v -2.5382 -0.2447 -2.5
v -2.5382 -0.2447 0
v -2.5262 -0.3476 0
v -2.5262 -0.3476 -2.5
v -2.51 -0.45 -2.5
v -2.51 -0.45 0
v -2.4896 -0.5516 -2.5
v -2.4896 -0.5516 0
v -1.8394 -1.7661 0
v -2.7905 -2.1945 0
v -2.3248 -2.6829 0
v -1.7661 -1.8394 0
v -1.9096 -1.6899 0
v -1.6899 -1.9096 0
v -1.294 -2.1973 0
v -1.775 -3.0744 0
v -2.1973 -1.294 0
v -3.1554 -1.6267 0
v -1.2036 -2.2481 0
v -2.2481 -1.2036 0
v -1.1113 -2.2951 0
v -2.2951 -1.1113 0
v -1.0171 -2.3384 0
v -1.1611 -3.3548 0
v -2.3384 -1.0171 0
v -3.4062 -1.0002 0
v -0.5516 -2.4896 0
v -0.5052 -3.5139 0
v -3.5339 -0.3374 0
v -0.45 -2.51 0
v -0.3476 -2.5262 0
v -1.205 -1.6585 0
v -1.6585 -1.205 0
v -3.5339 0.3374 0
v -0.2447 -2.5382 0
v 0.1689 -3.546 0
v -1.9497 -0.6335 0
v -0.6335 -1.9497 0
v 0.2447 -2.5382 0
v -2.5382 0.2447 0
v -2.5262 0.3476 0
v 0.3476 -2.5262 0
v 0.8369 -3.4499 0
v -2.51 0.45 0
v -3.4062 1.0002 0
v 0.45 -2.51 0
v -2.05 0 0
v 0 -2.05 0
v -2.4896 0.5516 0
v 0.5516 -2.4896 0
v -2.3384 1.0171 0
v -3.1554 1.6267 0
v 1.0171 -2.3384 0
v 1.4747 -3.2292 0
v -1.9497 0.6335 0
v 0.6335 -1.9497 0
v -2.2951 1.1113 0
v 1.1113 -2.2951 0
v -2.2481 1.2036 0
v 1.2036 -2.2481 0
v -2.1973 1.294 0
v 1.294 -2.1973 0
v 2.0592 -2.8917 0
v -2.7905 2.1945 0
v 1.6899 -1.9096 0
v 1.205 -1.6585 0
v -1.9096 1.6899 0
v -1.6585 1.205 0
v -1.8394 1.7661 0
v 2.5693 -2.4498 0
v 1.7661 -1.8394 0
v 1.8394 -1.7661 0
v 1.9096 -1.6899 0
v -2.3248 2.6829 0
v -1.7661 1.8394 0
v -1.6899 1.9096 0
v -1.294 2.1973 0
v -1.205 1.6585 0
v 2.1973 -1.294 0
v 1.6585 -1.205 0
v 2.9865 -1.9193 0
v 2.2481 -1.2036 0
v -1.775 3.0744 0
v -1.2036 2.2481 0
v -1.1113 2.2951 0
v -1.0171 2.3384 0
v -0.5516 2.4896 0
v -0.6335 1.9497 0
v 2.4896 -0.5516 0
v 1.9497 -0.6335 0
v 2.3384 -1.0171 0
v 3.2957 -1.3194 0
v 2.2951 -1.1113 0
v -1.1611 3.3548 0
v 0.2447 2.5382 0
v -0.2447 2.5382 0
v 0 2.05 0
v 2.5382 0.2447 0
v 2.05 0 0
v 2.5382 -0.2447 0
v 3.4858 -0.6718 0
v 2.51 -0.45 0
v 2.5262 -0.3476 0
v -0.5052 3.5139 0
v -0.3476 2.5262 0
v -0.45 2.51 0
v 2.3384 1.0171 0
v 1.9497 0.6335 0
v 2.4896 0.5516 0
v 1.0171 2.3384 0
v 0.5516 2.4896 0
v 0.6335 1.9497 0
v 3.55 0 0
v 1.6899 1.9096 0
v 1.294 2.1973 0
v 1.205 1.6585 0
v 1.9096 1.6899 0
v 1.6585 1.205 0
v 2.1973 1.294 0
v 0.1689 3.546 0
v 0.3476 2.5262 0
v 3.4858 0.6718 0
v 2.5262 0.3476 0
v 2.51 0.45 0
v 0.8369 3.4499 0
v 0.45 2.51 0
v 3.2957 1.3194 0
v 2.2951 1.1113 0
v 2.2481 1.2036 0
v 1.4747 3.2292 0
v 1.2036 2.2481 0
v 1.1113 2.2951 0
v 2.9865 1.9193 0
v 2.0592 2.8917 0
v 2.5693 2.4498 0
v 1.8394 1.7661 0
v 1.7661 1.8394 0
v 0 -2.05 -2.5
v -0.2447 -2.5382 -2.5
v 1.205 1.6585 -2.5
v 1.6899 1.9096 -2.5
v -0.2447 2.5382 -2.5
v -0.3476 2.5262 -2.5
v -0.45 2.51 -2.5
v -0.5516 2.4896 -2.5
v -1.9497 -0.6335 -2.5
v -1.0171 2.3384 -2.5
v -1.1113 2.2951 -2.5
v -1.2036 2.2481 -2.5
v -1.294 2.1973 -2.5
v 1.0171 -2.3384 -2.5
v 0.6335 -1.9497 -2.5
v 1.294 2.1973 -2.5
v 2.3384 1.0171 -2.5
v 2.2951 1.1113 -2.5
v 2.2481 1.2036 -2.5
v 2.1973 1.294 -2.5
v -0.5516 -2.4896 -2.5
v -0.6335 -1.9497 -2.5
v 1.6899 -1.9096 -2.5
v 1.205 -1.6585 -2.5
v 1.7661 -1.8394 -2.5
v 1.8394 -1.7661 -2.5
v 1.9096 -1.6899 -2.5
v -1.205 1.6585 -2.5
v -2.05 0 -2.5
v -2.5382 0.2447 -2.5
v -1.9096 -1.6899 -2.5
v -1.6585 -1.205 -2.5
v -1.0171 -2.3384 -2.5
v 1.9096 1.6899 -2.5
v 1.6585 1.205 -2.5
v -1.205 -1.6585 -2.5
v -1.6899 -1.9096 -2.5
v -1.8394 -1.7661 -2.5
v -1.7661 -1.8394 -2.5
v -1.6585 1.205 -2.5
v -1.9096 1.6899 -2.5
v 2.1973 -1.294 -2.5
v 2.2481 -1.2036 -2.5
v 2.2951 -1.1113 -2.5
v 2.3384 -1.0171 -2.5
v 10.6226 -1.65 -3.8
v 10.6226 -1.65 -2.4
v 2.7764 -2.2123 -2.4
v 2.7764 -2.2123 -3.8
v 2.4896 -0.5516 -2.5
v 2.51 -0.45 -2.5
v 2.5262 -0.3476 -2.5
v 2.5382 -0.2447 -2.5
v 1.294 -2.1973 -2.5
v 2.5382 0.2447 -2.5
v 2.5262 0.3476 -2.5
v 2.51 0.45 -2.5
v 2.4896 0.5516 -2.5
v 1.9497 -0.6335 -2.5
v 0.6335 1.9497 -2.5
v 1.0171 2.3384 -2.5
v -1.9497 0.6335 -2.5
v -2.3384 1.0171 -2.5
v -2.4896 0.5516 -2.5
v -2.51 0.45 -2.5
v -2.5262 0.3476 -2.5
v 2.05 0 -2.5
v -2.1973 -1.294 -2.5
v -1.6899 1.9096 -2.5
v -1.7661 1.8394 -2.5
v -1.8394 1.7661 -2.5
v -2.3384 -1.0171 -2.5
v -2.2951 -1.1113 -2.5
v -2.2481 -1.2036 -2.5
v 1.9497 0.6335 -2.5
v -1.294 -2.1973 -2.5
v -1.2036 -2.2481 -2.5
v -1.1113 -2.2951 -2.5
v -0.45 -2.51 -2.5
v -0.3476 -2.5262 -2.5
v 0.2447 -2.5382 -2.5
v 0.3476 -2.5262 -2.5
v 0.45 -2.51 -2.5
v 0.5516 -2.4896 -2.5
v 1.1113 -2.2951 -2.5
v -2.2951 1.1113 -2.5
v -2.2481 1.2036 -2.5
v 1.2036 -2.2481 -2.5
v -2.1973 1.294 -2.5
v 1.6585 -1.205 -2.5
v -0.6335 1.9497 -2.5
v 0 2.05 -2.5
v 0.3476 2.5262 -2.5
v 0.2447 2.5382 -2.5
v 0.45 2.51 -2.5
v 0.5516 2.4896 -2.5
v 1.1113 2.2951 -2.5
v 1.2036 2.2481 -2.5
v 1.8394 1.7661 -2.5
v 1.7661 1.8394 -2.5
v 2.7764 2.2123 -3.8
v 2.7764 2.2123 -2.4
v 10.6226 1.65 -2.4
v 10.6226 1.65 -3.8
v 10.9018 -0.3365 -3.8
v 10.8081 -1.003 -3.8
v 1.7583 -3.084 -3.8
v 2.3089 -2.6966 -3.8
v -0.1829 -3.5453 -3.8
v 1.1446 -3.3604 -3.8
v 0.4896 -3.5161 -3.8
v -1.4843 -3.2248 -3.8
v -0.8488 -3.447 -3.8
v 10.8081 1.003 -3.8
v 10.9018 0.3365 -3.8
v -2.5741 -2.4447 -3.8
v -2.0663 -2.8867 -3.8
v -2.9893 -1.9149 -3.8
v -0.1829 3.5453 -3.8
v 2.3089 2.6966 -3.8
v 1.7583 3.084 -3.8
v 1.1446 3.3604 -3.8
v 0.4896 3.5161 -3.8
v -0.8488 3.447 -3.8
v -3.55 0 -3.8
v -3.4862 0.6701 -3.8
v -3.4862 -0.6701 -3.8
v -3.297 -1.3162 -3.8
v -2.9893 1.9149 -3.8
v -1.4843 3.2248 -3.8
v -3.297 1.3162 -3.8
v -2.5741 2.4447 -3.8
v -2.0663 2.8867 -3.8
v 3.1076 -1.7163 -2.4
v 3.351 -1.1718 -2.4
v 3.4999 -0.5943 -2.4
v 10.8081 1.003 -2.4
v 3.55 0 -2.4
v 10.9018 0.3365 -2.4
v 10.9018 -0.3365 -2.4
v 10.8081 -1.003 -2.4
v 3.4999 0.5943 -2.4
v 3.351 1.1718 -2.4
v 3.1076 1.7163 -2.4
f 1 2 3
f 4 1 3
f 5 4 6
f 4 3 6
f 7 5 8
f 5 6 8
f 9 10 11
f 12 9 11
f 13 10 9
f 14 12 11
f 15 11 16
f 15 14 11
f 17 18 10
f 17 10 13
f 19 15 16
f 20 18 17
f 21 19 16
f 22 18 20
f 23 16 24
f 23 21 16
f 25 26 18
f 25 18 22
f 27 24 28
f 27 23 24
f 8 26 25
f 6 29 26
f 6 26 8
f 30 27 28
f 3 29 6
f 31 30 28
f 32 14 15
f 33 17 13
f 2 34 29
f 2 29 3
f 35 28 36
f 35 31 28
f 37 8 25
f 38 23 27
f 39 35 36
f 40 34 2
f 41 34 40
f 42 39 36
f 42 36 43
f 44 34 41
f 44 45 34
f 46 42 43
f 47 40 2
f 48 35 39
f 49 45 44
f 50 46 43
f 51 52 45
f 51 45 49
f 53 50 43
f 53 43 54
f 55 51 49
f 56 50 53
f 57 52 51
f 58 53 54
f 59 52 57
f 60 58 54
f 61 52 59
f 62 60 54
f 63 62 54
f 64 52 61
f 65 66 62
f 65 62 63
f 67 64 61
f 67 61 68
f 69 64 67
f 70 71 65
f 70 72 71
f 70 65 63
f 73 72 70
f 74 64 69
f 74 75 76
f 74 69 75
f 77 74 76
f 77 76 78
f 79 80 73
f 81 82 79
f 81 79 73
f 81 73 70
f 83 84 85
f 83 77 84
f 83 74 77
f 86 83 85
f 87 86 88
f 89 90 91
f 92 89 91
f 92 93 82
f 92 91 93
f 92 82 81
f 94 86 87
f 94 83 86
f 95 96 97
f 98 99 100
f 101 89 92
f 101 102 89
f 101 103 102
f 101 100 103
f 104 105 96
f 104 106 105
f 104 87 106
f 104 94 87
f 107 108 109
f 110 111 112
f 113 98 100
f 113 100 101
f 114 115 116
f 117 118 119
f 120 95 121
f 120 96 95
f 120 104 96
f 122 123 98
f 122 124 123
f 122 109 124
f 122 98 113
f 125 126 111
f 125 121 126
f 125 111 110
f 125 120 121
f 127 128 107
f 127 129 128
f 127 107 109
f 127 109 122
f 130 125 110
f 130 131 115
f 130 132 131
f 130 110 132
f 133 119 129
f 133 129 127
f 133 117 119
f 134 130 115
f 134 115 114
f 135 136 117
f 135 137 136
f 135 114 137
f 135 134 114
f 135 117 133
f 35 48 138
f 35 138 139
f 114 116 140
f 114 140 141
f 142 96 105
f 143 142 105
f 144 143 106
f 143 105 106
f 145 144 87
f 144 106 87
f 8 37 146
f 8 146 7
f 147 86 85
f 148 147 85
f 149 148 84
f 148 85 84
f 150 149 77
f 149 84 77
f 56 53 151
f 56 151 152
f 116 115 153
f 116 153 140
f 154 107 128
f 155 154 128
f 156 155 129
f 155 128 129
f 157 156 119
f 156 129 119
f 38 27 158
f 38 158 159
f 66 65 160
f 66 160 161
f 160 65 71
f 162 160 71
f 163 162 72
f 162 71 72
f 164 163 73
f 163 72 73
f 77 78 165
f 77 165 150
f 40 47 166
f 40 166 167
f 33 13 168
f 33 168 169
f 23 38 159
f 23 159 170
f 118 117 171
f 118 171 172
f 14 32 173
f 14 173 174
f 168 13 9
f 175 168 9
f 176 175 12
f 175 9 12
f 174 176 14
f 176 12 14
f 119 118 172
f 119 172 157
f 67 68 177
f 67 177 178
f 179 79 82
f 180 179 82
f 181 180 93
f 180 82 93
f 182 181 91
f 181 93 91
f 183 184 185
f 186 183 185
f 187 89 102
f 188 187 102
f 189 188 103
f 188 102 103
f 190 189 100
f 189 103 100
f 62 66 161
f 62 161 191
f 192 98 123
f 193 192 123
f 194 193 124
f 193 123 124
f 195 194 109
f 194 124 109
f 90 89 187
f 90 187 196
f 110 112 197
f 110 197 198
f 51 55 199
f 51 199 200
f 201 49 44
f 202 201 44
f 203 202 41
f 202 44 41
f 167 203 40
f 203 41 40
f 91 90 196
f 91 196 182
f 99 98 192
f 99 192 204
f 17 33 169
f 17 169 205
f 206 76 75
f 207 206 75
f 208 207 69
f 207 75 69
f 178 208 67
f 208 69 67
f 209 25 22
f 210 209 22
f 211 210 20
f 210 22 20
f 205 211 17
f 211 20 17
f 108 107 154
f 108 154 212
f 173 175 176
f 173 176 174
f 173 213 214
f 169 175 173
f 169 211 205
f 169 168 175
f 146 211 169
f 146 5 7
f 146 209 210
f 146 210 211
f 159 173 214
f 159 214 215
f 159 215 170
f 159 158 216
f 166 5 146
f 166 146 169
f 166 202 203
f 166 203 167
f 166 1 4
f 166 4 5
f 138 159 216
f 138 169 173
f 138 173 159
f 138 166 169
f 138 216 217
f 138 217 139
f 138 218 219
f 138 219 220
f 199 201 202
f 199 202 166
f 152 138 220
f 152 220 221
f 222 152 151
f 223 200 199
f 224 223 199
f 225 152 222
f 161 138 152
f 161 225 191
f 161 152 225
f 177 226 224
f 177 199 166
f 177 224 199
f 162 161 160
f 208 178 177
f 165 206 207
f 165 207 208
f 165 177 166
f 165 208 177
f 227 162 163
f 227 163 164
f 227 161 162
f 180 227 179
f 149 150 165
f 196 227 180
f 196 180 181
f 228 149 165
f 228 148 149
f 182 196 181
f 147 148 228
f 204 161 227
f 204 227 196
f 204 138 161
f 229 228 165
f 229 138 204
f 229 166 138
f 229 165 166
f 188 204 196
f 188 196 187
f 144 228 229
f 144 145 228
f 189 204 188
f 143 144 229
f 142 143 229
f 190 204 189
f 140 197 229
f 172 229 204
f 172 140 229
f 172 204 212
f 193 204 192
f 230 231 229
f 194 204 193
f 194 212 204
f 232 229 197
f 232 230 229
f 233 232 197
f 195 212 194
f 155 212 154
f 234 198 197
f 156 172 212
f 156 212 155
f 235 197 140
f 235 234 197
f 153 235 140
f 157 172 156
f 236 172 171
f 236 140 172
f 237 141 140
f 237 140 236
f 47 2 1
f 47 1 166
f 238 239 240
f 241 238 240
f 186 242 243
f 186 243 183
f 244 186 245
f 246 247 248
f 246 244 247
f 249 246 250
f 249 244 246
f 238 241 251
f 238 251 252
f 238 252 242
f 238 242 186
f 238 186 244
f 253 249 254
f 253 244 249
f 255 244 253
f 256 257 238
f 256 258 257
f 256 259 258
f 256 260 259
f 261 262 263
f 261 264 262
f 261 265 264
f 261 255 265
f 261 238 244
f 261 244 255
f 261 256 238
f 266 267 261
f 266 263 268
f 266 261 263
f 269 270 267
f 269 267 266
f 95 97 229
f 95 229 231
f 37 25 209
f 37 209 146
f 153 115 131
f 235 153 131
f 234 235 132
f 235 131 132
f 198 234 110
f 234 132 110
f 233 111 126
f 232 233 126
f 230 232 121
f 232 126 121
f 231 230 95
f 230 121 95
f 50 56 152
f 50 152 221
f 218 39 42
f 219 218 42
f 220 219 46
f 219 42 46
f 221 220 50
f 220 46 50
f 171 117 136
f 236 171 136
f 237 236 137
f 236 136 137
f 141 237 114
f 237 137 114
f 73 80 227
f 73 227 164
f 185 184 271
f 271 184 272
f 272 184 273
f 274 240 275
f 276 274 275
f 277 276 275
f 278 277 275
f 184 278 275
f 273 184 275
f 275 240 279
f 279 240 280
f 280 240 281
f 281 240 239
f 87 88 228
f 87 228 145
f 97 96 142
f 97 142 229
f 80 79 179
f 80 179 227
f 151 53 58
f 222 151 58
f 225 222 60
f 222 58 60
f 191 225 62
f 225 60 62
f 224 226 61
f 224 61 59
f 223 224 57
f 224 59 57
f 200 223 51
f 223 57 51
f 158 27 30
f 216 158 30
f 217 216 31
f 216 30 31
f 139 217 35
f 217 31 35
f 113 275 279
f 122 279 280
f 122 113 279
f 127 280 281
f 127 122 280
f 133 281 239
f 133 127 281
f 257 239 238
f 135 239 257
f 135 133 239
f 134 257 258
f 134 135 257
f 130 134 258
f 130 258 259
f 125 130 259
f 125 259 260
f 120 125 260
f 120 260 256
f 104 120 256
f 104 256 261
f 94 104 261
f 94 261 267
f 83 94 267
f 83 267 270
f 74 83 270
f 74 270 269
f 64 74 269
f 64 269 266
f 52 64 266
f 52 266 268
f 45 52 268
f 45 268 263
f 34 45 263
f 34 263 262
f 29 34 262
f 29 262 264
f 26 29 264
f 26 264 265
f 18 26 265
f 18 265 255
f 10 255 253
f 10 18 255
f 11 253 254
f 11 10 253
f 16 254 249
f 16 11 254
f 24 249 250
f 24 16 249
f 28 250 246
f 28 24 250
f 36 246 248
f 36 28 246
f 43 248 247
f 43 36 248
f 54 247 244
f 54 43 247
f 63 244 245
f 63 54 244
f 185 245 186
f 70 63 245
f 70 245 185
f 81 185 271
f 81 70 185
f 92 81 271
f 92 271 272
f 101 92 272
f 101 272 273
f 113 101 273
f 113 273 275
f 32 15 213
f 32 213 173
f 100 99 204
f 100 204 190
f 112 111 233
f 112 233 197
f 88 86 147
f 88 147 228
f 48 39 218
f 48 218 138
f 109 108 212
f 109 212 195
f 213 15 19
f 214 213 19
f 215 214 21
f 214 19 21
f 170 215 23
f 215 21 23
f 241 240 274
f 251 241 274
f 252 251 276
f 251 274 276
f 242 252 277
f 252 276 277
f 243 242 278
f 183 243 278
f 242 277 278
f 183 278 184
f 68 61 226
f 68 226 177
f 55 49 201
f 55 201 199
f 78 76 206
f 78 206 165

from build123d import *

# Parameters (mm, degrees)
SKETCH2_R           = 3.55
BOSS_EXTRUDE1_DEPTH = 3.8
BOSS_EXTRUDE2_DEPTH = 1.4
SKETCH5_R           = 2.549999919
CUT_EXTRUDE1_DEPTH  = 2.5
BOSS_EXTRUDE3_DEPTH = 2.5


with BuildPart() as part:
    # Sketch2 → Boss-Extrude1 (new body)
    with BuildSketch(Plane.XY):
        Circle(SKETCH2_R)
    extrude(amount=-BOSS_EXTRUDE1_DEPTH)

    # Sketch4 → Boss-Extrude2 (add)
    with BuildSketch(Plane.XY.offset(-2.4)):
        with BuildLine():
            Line((2.776387215, 2.212277889), (10.622617722, 1.649999976))
            ThreePointArc((10.622617722, 1.649999976), (10.913548722, 0), (10.622617722, -1.649999976))
            Line((10.622617722, -1.649999976), (2.776387215, -2.212277889))
            ThreePointArc((2.776387215, -2.212277889), (3.549999952, 0), (2.776387215, 2.212277889))
        make_face()
    extrude(amount=-BOSS_EXTRUDE2_DEPTH)

    # Sketch5 → Cut-Extrude1 (cut)
    with BuildSketch(Plane.XY):
        Circle(SKETCH5_R)
    extrude(amount=-CUT_EXTRUDE1_DEPTH, mode=Mode.SUBTRACT)

    # Sketch3 → Boss-Extrude3 (add)
    with BuildSketch(Plane.XY):
        with BuildLine():
            Line((-0.244697916, 2.538232164), (0, 2.049999952))
            Line((0, 2.049999952), (0.244697916, 2.538232164))
            ThreePointArc((0.244697916, 2.538232164), (0, 2.549999919), (-0.244697916, 2.538232164))
        make_face()
        with BuildLine():
            Line((0.551635326, 2.489618054), (0.633484824, 1.949665813))
            Line((0.633484824, 1.949665813), (1.017078422, 2.338386424))
            ThreePointArc((1.017078422, 2.338386424), (0.787993311, 2.42519404), (0.551635326, 2.489618054))
        make_face()
        with BuildLine():
            Line((1.29397066, 2.197302783), (1.204959739, 1.6584848))
            Line((1.204959739, 1.6584848), (1.689900206, 1.90964313))
            ThreePointArc((1.689900206, 1.90964313), (1.498852346, 2.06299327), (1.29397066, 2.197302783))
        make_face()
        with BuildLine():
            Line((1.90964313, 1.689900206), (1.6584848, 1.204959739))
            Line((1.6584848, 1.204959739), (2.197302783, 1.29397066))
            ThreePointArc((2.197302783, 1.29397066), (2.06299327, 1.498852346), (1.90964313, 1.689900206))
        make_face()
        with BuildLine():
            Line((2.338386424, 1.017078422), (1.949665813, 0.633484824))
            Line((1.949665813, 0.633484824), (2.489618054, 0.551635326))
            ThreePointArc((2.489618054, 0.551635326), (2.42519404, 0.787993311), (2.338386424, 1.017078422))
        make_face()
        with BuildLine():
            Line((2.538232164, 0.244697916), (2.049999952, 0))
            Line((2.049999952, 0), (2.538232164, -0.244697916))
            ThreePointArc((2.538232164, -0.244697916), (2.549999919, 0), (2.538232164, 0.244697916))
        make_face()
        with BuildLine():
            Line((2.489618054, -0.551635326), (1.949665813, -0.633484824))
            Line((1.949665813, -0.633484824), (2.338386424, -1.017078422))
            ThreePointArc((2.338386424, -1.017078422), (2.42519404, -0.787993311), (2.489618054, -0.551635326))
        make_face()
        with BuildLine():
            Line((2.197302783, -1.29397066), (1.6584848, -1.204959739))
            Line((1.6584848, -1.204959739), (1.90964313, -1.689900206))
            ThreePointArc((1.90964313, -1.689900206), (2.06299327, -1.498852346), (2.197302783, -1.29397066))
        make_face()
        with BuildLine():
            Line((1.689900206, -1.90964313), (1.204959739, -1.6584848))
            Line((1.204959739, -1.6584848), (1.29397066, -2.197302783))
            ThreePointArc((1.29397066, -2.197302783), (1.498852346, -2.06299327), (1.689900206, -1.90964313))
        make_face()
        with BuildLine():
            Line((1.017078422, -2.338386424), (0.633484824, -1.949665813))
            Line((0.633484824, -1.949665813), (0.551635326, -2.489618054))
            ThreePointArc((0.551635326, -2.489618054), (0.787993311, -2.42519404), (1.017078422, -2.338386424))
        make_face()
        with BuildLine():
            Line((0.244697916, -2.538232164), (0, -2.049999952))
            Line((0, -2.049999952), (-0.244697916, -2.538232164))
            ThreePointArc((-0.244697916, -2.538232164), (0, -2.549999919), (0.244697916, -2.538232164))
        make_face()
        with BuildLine():
            Line((-0.551635326, -2.489618054), (-0.633484824, -1.949665813))
            Line((-0.633484824, -1.949665813), (-1.017078422, -2.338386424))
            ThreePointArc((-1.017078422, -2.338386424), (-0.787993311, -2.42519404), (-0.551635326, -2.489618054))
        make_face()
        with BuildLine():
            Line((-1.29397066, -2.197302783), (-1.204959739, -1.6584848))
            Line((-1.204959739, -1.6584848), (-1.689900206, -1.90964313))
            ThreePointArc((-1.689900206, -1.90964313), (-1.498852346, -2.06299327), (-1.29397066, -2.197302783))
        make_face()
        with BuildLine():
            Line((-1.90964313, -1.689900206), (-1.6584848, -1.204959739))
            Line((-1.6584848, -1.204959739), (-2.197302783, -1.29397066))
            ThreePointArc((-2.197302783, -1.29397066), (-2.06299327, -1.498852346), (-1.90964313, -1.689900206))
        make_face()
        with BuildLine():
            Line((-2.338386424, -1.017078422), (-1.949665813, -0.633484824))
            Line((-1.949665813, -0.633484824), (-2.489618054, -0.551635326))
            ThreePointArc((-2.489618054, -0.551635326), (-2.42519404, -0.787993311), (-2.338386424, -1.017078422))
        make_face()
        with BuildLine():
            Line((-2.538232164, -0.244697916), (-2.049999952, 0))
            Line((-2.049999952, 0), (-2.538232164, 0.244697916))
            ThreePointArc((-2.538232164, 0.244697916), (-2.549999919, 0), (-2.538232164, -0.244697916))
        make_face()
        with BuildLine():
            Line((-2.489618054, 0.551635326), (-1.949665813, 0.633484824))
            Line((-1.949665813, 0.633484824), (-2.338386424, 1.017078422))
            ThreePointArc((-2.338386424, 1.017078422), (-2.42519404, 0.787993311), (-2.489618054, 0.551635326))
        make_face()
        with BuildLine():
            Line((-2.197302783, 1.29397066), (-1.6584848, 1.204959739))
            Line((-1.6584848, 1.204959739), (-1.90964313, 1.689900206))
            ThreePointArc((-1.90964313, 1.689900206), (-2.06299327, 1.498852346), (-2.197302783, 1.29397066))
        make_face()
        with BuildLine():
            Line((-1.689900206, 1.90964313), (-1.204959739, 1.6584848))
            Line((-1.204959739, 1.6584848), (-1.29397066, 2.197302783))
            ThreePointArc((-1.29397066, 2.197302783), (-1.498852346, 2.06299327), (-1.689900206, 1.90964313))
        make_face()
        with BuildLine():
            Line((-1.017078422, 2.338386424), (-0.633484824, 1.949665813))
            Line((-0.633484824, 1.949665813), (-0.551635326, 2.489618054))
            ThreePointArc((-0.551635326, 2.489618054), (-0.787993311, 2.42519404), (-1.017078422, 2.338386424))
        make_face()
    extrude(amount=-BOSS_EXTRUDE3_DEPTH)


solid = part.part
